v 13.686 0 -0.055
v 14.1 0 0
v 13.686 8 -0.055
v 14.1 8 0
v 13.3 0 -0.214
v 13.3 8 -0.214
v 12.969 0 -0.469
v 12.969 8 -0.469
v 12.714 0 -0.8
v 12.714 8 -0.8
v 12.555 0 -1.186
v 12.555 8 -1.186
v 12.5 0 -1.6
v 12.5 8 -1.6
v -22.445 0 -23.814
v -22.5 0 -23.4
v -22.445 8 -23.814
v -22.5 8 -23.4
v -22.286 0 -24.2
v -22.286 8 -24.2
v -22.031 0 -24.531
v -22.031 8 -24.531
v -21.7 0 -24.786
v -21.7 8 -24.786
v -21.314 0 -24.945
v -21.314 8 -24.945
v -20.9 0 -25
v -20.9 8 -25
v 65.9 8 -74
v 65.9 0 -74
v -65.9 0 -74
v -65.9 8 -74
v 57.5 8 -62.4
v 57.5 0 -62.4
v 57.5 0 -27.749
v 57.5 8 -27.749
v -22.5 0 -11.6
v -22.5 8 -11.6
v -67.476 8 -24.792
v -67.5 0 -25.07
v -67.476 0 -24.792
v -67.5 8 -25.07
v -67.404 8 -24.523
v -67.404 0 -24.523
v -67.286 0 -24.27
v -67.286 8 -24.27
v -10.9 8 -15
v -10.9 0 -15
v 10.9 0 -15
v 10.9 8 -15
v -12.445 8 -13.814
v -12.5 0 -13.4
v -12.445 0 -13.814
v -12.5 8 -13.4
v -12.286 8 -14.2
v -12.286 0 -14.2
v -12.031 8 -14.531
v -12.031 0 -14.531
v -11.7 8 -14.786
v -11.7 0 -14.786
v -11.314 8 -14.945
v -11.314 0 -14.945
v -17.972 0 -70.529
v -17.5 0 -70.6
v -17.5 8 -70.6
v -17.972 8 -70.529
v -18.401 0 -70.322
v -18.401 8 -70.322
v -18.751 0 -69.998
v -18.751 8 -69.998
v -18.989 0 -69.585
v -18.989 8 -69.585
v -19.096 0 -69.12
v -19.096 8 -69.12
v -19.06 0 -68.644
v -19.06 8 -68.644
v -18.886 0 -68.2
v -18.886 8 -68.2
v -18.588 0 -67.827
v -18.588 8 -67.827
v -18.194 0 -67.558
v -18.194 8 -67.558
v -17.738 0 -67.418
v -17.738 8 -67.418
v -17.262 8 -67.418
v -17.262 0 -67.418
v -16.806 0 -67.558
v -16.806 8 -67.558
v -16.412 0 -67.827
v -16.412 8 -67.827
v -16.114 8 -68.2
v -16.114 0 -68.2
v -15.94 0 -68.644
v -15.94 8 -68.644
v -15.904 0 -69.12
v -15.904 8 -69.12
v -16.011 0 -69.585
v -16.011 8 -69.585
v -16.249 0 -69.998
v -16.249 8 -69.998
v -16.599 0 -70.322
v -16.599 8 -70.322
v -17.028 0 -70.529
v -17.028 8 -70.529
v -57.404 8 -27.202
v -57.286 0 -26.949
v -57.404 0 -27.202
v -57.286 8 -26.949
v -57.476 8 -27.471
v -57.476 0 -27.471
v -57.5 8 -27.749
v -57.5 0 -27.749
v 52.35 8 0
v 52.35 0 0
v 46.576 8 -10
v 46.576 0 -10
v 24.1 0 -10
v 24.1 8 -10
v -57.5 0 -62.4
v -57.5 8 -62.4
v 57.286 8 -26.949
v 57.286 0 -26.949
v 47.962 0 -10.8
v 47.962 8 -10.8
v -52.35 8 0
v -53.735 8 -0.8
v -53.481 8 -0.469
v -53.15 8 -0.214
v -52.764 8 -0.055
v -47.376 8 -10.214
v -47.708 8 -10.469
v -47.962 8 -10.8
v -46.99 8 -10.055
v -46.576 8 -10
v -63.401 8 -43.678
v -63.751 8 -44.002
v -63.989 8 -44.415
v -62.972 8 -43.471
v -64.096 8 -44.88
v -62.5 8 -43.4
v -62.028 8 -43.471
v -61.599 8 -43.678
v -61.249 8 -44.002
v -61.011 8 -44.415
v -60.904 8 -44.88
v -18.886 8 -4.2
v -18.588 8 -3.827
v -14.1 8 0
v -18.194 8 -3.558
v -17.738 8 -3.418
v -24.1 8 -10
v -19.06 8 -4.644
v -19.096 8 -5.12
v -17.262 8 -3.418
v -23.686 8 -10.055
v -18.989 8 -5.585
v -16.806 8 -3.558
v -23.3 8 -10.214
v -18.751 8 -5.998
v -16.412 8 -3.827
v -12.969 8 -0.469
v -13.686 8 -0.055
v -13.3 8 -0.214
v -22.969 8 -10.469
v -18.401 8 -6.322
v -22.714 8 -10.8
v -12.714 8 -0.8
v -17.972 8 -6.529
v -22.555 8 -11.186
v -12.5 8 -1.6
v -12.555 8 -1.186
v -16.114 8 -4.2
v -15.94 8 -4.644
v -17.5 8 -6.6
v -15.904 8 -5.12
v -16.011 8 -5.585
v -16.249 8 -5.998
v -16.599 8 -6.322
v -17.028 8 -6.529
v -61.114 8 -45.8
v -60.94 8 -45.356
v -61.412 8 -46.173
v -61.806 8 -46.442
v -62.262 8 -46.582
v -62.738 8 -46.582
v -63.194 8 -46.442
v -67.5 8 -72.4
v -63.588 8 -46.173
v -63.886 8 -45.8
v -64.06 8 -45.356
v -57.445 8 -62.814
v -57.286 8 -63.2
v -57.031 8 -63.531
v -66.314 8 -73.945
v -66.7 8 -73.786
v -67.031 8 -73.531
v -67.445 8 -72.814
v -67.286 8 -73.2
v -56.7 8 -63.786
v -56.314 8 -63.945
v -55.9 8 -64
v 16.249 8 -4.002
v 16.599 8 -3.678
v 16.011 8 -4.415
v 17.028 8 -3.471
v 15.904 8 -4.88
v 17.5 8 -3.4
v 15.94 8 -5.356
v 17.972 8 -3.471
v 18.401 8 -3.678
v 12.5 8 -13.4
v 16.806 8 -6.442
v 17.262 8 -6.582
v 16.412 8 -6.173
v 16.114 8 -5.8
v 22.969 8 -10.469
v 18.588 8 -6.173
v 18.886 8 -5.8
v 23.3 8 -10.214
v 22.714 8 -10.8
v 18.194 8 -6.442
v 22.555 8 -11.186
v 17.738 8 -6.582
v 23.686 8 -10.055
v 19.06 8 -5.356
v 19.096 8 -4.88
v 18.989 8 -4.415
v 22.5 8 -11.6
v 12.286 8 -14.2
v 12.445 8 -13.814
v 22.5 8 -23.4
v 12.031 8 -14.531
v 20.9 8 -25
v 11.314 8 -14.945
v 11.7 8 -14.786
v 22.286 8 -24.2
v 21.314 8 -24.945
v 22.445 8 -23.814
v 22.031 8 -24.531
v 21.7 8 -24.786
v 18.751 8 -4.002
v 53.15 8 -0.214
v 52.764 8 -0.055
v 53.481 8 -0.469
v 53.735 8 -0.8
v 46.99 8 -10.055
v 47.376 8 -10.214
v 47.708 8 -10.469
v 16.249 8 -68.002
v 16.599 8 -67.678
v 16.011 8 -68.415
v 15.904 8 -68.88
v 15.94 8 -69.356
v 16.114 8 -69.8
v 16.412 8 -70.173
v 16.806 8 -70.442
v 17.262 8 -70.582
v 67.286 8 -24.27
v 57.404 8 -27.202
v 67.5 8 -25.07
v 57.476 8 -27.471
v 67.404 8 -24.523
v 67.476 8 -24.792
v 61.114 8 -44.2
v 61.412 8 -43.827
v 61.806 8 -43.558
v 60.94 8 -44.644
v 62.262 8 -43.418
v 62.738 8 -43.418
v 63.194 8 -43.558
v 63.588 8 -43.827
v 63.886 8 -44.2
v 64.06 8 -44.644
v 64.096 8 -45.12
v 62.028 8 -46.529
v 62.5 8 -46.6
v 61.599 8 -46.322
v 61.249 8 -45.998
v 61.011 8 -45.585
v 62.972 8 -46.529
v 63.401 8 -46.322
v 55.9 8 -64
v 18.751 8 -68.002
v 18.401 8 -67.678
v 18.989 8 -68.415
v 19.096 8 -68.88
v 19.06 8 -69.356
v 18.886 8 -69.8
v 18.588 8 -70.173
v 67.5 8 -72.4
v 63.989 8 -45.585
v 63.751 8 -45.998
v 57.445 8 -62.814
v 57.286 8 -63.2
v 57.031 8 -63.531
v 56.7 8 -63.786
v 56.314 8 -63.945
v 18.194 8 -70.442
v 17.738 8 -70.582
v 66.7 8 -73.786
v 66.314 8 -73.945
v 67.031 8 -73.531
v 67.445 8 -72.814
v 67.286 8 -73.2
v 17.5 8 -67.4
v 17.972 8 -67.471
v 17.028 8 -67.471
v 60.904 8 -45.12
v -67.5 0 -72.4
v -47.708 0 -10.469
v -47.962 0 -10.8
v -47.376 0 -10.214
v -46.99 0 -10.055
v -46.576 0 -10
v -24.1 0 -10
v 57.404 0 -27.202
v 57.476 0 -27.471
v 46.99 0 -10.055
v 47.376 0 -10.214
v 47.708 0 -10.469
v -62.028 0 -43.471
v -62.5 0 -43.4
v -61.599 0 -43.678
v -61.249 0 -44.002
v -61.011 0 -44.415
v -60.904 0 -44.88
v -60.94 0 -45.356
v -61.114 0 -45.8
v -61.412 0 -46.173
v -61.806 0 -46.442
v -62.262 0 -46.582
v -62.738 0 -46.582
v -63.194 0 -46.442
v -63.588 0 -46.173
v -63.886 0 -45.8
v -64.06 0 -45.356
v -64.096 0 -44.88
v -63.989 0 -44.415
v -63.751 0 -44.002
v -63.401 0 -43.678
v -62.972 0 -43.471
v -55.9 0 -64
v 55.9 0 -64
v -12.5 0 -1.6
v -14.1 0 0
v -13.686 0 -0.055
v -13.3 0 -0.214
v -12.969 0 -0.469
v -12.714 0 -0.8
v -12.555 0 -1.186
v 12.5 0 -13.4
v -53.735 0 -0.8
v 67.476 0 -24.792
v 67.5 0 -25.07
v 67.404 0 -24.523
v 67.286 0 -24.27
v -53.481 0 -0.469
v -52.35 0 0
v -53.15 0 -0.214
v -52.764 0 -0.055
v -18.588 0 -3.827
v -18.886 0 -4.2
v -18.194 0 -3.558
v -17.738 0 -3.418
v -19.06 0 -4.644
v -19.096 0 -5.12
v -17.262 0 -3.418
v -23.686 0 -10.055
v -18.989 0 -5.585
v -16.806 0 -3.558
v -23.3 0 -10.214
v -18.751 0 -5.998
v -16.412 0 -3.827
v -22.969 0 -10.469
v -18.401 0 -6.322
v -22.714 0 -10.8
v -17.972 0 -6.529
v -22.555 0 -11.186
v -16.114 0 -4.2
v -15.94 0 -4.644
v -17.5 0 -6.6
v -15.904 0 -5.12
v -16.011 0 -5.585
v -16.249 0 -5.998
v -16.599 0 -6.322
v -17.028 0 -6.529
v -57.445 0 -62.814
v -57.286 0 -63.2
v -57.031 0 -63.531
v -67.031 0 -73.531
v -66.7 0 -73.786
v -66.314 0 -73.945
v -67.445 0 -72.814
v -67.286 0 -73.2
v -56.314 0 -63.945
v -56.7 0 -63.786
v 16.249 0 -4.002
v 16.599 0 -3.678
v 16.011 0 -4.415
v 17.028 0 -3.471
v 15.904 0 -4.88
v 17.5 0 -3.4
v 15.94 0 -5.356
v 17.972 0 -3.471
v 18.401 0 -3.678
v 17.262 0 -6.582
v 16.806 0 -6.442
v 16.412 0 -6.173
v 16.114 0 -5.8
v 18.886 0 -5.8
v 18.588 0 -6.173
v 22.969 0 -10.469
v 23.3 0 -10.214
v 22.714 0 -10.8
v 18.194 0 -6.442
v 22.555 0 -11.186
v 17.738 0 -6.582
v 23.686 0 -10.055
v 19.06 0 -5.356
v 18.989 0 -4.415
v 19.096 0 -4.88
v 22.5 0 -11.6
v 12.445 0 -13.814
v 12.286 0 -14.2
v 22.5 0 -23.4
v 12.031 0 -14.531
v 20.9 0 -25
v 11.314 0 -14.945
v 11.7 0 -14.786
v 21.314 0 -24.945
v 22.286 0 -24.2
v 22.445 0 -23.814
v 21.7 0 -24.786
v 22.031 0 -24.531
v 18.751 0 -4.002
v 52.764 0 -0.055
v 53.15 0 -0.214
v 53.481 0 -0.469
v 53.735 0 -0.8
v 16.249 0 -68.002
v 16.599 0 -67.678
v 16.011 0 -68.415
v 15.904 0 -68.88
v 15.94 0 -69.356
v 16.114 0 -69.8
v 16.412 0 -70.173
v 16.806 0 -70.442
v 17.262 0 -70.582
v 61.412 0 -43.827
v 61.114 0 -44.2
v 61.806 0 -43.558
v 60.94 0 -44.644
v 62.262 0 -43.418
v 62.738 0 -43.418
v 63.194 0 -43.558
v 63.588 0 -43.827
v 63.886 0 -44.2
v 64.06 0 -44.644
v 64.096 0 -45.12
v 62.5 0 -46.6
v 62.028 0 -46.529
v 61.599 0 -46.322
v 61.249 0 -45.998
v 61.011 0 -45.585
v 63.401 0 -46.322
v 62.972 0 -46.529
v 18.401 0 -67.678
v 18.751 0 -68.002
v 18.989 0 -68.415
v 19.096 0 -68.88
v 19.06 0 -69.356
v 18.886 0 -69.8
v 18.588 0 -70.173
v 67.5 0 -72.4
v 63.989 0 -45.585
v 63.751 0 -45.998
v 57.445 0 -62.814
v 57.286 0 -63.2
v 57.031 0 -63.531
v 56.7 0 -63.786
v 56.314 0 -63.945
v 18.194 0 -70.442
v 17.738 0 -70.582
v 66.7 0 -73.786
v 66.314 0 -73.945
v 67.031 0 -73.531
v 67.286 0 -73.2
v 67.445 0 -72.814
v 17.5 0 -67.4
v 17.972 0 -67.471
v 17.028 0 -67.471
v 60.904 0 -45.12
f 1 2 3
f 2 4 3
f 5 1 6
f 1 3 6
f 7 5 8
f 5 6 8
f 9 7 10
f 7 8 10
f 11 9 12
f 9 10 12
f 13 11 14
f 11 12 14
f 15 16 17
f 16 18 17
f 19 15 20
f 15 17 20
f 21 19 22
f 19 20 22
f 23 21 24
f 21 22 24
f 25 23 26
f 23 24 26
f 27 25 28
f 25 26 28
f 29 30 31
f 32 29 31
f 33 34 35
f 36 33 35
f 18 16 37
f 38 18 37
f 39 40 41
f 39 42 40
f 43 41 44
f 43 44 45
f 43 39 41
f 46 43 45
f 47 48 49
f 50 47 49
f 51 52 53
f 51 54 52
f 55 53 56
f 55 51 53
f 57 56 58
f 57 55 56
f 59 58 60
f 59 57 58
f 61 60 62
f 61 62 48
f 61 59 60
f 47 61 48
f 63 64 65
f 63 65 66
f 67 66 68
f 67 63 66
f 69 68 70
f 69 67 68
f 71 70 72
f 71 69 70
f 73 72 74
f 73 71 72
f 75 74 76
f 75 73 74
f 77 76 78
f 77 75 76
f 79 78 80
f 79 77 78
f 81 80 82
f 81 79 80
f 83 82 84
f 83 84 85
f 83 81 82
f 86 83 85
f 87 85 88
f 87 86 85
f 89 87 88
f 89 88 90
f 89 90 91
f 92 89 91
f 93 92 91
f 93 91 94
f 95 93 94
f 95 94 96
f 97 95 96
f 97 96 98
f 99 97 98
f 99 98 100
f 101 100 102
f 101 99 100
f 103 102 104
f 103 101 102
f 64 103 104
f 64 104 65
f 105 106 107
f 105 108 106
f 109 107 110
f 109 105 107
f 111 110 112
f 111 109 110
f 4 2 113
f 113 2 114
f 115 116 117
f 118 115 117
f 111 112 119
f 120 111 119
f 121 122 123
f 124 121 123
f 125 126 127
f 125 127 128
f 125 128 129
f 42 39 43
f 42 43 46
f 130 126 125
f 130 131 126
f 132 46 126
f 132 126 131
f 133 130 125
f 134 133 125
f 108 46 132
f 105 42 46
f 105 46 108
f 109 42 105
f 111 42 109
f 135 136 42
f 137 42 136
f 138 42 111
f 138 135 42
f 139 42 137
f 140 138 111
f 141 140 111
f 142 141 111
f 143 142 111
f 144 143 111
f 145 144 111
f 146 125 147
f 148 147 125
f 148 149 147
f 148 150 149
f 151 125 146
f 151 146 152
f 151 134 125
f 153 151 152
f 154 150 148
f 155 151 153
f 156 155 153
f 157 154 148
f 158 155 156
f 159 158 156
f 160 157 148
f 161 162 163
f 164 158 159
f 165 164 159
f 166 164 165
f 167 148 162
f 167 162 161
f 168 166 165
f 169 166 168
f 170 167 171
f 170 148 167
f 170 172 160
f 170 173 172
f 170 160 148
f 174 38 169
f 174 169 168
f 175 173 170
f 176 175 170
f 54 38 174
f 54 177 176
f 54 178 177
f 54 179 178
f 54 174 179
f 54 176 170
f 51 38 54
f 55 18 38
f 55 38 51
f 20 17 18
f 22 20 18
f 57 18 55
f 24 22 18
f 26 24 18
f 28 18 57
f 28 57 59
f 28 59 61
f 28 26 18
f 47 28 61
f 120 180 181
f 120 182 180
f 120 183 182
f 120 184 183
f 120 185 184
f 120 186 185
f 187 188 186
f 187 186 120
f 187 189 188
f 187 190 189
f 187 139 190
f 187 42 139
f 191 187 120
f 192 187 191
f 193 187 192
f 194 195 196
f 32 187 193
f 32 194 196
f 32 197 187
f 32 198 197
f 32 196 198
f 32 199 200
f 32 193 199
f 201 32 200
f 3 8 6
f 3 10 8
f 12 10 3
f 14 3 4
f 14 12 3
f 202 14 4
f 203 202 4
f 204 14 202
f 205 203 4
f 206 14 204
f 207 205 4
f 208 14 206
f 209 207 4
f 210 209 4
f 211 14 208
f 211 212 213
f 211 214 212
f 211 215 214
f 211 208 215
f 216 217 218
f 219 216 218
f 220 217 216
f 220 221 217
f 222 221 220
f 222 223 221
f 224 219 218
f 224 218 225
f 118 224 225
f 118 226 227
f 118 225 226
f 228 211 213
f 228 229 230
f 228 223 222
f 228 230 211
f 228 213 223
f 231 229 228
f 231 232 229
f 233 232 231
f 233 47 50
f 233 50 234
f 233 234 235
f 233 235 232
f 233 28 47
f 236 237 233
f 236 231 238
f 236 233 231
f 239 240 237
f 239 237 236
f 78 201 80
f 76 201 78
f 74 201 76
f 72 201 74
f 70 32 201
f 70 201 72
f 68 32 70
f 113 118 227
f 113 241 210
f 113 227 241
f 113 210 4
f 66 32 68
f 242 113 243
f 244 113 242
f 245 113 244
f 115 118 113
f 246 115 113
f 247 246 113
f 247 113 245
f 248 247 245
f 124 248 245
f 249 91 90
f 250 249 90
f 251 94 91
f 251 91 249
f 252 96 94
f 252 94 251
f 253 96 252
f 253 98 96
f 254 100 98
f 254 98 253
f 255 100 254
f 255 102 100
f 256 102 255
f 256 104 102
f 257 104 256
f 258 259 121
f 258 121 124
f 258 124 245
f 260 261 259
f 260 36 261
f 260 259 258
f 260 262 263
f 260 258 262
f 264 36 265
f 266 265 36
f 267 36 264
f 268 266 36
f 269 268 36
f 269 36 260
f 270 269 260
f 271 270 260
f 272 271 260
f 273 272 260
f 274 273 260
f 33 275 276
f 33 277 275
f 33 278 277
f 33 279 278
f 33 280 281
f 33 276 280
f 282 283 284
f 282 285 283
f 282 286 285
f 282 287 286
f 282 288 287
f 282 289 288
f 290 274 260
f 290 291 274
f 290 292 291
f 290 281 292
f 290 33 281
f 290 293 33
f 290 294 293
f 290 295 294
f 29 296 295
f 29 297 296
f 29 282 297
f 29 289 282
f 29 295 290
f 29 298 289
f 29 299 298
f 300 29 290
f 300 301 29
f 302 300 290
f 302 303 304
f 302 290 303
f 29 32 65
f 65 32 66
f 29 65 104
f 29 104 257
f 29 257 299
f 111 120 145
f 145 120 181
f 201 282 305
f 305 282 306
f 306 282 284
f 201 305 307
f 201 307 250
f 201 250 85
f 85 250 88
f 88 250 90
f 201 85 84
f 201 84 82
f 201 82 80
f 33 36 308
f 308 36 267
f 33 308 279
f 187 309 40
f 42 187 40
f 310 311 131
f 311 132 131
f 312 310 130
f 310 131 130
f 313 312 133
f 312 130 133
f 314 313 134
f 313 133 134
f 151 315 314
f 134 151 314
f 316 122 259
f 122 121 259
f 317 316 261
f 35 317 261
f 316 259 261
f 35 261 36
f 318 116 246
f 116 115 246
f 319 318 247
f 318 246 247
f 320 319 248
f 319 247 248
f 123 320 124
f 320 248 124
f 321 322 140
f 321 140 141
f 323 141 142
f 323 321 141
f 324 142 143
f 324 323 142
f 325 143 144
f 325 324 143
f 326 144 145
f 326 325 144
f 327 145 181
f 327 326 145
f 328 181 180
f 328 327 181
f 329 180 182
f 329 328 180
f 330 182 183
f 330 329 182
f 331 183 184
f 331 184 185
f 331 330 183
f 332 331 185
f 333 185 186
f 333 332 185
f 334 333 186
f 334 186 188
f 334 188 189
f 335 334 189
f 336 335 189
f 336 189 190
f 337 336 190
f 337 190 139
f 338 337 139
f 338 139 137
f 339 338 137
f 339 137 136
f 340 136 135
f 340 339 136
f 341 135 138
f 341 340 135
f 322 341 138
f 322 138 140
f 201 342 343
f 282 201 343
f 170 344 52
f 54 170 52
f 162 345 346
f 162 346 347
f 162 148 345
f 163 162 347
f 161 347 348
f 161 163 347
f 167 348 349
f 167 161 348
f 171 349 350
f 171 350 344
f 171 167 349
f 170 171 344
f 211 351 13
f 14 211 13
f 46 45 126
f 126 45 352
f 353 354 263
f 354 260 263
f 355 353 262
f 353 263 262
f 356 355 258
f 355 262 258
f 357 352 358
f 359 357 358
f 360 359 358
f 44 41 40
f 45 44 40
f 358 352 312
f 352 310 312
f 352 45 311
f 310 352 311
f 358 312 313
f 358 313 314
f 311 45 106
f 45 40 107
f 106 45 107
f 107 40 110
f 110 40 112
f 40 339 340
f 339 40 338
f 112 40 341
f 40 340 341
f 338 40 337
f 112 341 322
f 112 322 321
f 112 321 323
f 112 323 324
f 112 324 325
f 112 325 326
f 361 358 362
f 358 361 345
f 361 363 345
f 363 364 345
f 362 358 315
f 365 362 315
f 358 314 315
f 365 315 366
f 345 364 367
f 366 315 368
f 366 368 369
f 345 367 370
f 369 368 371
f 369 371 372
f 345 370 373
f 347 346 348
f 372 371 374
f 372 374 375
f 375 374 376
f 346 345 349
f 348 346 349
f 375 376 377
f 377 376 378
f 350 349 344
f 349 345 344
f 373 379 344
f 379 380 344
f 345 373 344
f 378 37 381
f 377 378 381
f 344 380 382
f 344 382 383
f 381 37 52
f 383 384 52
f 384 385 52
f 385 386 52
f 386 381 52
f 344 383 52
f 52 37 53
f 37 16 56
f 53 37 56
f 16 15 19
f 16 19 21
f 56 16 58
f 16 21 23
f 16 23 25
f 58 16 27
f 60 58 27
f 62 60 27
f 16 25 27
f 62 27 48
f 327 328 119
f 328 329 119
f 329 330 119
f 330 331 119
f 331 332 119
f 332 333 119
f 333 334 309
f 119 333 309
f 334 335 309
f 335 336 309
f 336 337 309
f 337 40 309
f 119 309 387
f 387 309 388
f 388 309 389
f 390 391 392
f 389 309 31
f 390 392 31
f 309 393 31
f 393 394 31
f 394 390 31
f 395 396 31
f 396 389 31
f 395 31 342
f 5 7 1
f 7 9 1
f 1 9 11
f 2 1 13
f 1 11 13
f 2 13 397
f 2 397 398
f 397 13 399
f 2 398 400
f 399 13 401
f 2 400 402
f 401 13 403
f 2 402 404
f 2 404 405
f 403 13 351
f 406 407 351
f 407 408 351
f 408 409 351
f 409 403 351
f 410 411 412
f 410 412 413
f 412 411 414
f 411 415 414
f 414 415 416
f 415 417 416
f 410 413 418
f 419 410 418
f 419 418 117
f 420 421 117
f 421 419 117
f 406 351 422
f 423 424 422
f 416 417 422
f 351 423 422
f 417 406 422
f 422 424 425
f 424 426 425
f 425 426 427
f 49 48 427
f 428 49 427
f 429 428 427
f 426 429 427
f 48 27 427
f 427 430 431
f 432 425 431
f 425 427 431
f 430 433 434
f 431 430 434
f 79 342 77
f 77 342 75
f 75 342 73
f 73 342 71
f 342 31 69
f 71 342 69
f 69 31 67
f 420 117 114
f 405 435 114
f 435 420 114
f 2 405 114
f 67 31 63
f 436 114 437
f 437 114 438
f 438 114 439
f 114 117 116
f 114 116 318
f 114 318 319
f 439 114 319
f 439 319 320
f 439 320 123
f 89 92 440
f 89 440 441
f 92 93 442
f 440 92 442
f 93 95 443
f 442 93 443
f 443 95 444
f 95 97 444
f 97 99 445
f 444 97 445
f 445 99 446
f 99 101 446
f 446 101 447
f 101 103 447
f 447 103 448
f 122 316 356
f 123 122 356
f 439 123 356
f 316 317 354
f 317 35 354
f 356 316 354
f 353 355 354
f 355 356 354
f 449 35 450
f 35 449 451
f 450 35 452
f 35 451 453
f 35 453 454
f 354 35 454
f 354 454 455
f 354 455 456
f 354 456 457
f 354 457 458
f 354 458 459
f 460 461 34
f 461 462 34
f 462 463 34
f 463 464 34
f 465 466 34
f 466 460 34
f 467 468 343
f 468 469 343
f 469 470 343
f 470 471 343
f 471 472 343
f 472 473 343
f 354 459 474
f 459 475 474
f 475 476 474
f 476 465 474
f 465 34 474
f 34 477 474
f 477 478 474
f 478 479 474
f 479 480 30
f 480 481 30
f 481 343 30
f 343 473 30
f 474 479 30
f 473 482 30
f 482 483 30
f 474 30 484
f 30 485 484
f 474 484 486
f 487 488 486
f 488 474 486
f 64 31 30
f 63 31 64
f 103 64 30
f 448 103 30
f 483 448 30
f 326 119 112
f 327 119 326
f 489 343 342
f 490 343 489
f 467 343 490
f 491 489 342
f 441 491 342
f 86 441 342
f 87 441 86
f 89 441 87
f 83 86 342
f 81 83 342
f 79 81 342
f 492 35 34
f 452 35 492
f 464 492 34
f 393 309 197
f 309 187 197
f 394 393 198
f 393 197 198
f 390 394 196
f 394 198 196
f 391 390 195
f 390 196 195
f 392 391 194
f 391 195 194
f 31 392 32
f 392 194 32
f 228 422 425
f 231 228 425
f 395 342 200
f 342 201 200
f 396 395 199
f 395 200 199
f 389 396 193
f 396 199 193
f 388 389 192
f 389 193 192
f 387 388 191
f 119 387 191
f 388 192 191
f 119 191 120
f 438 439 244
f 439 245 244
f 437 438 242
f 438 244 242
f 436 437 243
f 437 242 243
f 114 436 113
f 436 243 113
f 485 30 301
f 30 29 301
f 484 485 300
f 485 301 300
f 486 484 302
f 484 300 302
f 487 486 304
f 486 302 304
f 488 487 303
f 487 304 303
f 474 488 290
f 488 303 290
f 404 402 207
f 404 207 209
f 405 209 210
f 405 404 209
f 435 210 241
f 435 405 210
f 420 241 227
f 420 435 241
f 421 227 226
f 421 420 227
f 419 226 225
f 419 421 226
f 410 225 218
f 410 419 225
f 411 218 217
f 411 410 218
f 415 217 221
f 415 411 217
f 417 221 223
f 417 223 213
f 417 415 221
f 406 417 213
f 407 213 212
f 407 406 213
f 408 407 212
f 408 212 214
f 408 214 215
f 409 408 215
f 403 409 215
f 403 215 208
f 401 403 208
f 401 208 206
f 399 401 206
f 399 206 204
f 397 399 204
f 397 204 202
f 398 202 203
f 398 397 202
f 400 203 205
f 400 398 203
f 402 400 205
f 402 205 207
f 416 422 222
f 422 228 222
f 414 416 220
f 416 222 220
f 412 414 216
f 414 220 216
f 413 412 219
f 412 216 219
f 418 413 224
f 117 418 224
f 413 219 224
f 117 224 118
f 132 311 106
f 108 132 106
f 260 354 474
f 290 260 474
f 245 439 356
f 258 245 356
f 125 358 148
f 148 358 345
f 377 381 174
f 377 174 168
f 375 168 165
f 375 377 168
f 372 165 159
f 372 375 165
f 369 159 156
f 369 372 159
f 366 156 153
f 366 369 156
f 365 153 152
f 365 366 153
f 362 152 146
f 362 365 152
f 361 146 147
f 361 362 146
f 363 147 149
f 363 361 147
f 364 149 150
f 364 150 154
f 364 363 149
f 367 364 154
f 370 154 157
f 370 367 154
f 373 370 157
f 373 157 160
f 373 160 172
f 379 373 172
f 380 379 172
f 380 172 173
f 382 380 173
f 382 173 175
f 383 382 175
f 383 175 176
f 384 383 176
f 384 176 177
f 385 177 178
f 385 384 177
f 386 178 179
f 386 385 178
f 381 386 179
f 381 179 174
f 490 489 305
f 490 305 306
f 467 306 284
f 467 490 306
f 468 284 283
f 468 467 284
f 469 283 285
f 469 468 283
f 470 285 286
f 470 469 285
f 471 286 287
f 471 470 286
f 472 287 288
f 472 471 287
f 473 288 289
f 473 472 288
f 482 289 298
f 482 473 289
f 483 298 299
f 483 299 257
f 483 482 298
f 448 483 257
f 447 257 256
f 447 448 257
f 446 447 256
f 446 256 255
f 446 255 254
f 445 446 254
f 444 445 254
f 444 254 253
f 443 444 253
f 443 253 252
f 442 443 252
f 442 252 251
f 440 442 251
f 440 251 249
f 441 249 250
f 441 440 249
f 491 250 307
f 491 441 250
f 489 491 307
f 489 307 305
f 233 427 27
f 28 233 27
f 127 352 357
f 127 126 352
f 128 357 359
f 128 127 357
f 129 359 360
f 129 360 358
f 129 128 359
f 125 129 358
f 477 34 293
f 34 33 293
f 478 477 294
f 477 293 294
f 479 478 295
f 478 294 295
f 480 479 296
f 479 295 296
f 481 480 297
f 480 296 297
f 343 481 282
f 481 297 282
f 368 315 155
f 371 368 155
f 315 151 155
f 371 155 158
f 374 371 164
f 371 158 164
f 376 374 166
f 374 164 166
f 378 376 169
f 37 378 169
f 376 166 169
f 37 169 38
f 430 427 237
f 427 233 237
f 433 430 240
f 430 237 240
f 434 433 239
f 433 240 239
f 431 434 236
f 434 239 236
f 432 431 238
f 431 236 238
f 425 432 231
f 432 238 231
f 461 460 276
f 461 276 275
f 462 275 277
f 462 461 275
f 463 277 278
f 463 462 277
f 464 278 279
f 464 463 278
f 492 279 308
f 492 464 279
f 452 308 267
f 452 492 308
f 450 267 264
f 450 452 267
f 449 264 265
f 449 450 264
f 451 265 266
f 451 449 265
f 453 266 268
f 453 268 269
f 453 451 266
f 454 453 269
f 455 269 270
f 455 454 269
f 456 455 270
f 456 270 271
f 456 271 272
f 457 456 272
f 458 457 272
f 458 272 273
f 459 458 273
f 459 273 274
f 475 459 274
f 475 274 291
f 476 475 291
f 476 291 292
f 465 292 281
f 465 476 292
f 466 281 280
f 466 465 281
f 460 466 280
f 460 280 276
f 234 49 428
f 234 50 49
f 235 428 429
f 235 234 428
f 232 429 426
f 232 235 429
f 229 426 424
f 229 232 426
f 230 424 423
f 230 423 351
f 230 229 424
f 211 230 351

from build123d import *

# Parameters (mm, degrees)
SKETCH_1_R      = 1.6
EXTRUDE_1_DEPTH = 8
FILLET_1_R      = 1.6


with BuildPart() as part:
    # 草图1 → 凸台-拉伸1 (new body)
    with BuildSketch(Plane(origin=(0, 0, 0), x_dir=(1, 0, 0), z_dir=(0, 1, 0))):
        Polygon((-67.5, 74), (-67.5, 24.641016151), (-53.273502692, 0), (-12.5, 0), (-12.5, 15), (12.5, 15), (12.5, 0), (53.273502692, 0), (67.5, 24.641016151), (67.5, 74), align=None)
        with Locations(Location((17.5, 5, 0), (0, 0, 270))):
            Circle(SKETCH_1_R, mode=Mode.SUBTRACT)
        with Locations(Location((-62.5, 45, 0), (0, 0, 270))):
            Circle(SKETCH_1_R, mode=Mode.SUBTRACT)
        with Locations(Location((17.5, 69, 0), (0, 0, 270))):
            Circle(SKETCH_1_R, mode=Mode.SUBTRACT)
        with Locations(Location((-17.5, 5, 0), (0, 0, 90))):
            Circle(SKETCH_1_R, mode=Mode.SUBTRACT)
        with Locations(Location((-17.5, 69, 0), (0, 0, 90))):
            Circle(SKETCH_1_R, mode=Mode.SUBTRACT)
        with Locations(Location((62.5, 45, 0), (0, 0, 90))):
            Circle(SKETCH_1_R, mode=Mode.SUBTRACT)
        Polygon((-57.5, 27.320508076), (-57.5, 64), (57.5, 64), (57.5, 27.320508076), (47.5, 10), (22.5, 10), (22.5, 25), (-22.5, 25), (-22.5, 10), (-47.5, 10), align=None, mode=Mode.SUBTRACT)
    extrude(amount=EXTRUDE_1_DEPTH)

    # 圆角1
    fillet_1_edges = [part.edges().sort_by_distance(p)[0] for p in [
        (67.5, 4, -74),
        (67.5, 4, -24.641016151),
        (53.273502692, 4, 0),
        (12.5, 4, 0),
        (12.5, 4, -15),
        (-12.5, 4, -15),
        (-12.5, 4, 0),
        (-53.273502692, 4, 0),
        (-67.5, 4, -24.641016151),
        (-67.5, 4, -74),
        (57.5, 4, -27.320508076),
        (57.5, 4, -64),
        (-57.5, 4, -64),
        (-57.5, 4, -27.320508076),
        (-47.5, 4, -10),
        (-22.5, 4, -10),
        (-22.5, 4, -25),
        (22.5, 4, -25),
        (22.5, 4, -10),
        (47.5, 4, -10),
    ]]
    fillet(fillet_1_edges, radius=FILLET_1_R)


solid = part.part
